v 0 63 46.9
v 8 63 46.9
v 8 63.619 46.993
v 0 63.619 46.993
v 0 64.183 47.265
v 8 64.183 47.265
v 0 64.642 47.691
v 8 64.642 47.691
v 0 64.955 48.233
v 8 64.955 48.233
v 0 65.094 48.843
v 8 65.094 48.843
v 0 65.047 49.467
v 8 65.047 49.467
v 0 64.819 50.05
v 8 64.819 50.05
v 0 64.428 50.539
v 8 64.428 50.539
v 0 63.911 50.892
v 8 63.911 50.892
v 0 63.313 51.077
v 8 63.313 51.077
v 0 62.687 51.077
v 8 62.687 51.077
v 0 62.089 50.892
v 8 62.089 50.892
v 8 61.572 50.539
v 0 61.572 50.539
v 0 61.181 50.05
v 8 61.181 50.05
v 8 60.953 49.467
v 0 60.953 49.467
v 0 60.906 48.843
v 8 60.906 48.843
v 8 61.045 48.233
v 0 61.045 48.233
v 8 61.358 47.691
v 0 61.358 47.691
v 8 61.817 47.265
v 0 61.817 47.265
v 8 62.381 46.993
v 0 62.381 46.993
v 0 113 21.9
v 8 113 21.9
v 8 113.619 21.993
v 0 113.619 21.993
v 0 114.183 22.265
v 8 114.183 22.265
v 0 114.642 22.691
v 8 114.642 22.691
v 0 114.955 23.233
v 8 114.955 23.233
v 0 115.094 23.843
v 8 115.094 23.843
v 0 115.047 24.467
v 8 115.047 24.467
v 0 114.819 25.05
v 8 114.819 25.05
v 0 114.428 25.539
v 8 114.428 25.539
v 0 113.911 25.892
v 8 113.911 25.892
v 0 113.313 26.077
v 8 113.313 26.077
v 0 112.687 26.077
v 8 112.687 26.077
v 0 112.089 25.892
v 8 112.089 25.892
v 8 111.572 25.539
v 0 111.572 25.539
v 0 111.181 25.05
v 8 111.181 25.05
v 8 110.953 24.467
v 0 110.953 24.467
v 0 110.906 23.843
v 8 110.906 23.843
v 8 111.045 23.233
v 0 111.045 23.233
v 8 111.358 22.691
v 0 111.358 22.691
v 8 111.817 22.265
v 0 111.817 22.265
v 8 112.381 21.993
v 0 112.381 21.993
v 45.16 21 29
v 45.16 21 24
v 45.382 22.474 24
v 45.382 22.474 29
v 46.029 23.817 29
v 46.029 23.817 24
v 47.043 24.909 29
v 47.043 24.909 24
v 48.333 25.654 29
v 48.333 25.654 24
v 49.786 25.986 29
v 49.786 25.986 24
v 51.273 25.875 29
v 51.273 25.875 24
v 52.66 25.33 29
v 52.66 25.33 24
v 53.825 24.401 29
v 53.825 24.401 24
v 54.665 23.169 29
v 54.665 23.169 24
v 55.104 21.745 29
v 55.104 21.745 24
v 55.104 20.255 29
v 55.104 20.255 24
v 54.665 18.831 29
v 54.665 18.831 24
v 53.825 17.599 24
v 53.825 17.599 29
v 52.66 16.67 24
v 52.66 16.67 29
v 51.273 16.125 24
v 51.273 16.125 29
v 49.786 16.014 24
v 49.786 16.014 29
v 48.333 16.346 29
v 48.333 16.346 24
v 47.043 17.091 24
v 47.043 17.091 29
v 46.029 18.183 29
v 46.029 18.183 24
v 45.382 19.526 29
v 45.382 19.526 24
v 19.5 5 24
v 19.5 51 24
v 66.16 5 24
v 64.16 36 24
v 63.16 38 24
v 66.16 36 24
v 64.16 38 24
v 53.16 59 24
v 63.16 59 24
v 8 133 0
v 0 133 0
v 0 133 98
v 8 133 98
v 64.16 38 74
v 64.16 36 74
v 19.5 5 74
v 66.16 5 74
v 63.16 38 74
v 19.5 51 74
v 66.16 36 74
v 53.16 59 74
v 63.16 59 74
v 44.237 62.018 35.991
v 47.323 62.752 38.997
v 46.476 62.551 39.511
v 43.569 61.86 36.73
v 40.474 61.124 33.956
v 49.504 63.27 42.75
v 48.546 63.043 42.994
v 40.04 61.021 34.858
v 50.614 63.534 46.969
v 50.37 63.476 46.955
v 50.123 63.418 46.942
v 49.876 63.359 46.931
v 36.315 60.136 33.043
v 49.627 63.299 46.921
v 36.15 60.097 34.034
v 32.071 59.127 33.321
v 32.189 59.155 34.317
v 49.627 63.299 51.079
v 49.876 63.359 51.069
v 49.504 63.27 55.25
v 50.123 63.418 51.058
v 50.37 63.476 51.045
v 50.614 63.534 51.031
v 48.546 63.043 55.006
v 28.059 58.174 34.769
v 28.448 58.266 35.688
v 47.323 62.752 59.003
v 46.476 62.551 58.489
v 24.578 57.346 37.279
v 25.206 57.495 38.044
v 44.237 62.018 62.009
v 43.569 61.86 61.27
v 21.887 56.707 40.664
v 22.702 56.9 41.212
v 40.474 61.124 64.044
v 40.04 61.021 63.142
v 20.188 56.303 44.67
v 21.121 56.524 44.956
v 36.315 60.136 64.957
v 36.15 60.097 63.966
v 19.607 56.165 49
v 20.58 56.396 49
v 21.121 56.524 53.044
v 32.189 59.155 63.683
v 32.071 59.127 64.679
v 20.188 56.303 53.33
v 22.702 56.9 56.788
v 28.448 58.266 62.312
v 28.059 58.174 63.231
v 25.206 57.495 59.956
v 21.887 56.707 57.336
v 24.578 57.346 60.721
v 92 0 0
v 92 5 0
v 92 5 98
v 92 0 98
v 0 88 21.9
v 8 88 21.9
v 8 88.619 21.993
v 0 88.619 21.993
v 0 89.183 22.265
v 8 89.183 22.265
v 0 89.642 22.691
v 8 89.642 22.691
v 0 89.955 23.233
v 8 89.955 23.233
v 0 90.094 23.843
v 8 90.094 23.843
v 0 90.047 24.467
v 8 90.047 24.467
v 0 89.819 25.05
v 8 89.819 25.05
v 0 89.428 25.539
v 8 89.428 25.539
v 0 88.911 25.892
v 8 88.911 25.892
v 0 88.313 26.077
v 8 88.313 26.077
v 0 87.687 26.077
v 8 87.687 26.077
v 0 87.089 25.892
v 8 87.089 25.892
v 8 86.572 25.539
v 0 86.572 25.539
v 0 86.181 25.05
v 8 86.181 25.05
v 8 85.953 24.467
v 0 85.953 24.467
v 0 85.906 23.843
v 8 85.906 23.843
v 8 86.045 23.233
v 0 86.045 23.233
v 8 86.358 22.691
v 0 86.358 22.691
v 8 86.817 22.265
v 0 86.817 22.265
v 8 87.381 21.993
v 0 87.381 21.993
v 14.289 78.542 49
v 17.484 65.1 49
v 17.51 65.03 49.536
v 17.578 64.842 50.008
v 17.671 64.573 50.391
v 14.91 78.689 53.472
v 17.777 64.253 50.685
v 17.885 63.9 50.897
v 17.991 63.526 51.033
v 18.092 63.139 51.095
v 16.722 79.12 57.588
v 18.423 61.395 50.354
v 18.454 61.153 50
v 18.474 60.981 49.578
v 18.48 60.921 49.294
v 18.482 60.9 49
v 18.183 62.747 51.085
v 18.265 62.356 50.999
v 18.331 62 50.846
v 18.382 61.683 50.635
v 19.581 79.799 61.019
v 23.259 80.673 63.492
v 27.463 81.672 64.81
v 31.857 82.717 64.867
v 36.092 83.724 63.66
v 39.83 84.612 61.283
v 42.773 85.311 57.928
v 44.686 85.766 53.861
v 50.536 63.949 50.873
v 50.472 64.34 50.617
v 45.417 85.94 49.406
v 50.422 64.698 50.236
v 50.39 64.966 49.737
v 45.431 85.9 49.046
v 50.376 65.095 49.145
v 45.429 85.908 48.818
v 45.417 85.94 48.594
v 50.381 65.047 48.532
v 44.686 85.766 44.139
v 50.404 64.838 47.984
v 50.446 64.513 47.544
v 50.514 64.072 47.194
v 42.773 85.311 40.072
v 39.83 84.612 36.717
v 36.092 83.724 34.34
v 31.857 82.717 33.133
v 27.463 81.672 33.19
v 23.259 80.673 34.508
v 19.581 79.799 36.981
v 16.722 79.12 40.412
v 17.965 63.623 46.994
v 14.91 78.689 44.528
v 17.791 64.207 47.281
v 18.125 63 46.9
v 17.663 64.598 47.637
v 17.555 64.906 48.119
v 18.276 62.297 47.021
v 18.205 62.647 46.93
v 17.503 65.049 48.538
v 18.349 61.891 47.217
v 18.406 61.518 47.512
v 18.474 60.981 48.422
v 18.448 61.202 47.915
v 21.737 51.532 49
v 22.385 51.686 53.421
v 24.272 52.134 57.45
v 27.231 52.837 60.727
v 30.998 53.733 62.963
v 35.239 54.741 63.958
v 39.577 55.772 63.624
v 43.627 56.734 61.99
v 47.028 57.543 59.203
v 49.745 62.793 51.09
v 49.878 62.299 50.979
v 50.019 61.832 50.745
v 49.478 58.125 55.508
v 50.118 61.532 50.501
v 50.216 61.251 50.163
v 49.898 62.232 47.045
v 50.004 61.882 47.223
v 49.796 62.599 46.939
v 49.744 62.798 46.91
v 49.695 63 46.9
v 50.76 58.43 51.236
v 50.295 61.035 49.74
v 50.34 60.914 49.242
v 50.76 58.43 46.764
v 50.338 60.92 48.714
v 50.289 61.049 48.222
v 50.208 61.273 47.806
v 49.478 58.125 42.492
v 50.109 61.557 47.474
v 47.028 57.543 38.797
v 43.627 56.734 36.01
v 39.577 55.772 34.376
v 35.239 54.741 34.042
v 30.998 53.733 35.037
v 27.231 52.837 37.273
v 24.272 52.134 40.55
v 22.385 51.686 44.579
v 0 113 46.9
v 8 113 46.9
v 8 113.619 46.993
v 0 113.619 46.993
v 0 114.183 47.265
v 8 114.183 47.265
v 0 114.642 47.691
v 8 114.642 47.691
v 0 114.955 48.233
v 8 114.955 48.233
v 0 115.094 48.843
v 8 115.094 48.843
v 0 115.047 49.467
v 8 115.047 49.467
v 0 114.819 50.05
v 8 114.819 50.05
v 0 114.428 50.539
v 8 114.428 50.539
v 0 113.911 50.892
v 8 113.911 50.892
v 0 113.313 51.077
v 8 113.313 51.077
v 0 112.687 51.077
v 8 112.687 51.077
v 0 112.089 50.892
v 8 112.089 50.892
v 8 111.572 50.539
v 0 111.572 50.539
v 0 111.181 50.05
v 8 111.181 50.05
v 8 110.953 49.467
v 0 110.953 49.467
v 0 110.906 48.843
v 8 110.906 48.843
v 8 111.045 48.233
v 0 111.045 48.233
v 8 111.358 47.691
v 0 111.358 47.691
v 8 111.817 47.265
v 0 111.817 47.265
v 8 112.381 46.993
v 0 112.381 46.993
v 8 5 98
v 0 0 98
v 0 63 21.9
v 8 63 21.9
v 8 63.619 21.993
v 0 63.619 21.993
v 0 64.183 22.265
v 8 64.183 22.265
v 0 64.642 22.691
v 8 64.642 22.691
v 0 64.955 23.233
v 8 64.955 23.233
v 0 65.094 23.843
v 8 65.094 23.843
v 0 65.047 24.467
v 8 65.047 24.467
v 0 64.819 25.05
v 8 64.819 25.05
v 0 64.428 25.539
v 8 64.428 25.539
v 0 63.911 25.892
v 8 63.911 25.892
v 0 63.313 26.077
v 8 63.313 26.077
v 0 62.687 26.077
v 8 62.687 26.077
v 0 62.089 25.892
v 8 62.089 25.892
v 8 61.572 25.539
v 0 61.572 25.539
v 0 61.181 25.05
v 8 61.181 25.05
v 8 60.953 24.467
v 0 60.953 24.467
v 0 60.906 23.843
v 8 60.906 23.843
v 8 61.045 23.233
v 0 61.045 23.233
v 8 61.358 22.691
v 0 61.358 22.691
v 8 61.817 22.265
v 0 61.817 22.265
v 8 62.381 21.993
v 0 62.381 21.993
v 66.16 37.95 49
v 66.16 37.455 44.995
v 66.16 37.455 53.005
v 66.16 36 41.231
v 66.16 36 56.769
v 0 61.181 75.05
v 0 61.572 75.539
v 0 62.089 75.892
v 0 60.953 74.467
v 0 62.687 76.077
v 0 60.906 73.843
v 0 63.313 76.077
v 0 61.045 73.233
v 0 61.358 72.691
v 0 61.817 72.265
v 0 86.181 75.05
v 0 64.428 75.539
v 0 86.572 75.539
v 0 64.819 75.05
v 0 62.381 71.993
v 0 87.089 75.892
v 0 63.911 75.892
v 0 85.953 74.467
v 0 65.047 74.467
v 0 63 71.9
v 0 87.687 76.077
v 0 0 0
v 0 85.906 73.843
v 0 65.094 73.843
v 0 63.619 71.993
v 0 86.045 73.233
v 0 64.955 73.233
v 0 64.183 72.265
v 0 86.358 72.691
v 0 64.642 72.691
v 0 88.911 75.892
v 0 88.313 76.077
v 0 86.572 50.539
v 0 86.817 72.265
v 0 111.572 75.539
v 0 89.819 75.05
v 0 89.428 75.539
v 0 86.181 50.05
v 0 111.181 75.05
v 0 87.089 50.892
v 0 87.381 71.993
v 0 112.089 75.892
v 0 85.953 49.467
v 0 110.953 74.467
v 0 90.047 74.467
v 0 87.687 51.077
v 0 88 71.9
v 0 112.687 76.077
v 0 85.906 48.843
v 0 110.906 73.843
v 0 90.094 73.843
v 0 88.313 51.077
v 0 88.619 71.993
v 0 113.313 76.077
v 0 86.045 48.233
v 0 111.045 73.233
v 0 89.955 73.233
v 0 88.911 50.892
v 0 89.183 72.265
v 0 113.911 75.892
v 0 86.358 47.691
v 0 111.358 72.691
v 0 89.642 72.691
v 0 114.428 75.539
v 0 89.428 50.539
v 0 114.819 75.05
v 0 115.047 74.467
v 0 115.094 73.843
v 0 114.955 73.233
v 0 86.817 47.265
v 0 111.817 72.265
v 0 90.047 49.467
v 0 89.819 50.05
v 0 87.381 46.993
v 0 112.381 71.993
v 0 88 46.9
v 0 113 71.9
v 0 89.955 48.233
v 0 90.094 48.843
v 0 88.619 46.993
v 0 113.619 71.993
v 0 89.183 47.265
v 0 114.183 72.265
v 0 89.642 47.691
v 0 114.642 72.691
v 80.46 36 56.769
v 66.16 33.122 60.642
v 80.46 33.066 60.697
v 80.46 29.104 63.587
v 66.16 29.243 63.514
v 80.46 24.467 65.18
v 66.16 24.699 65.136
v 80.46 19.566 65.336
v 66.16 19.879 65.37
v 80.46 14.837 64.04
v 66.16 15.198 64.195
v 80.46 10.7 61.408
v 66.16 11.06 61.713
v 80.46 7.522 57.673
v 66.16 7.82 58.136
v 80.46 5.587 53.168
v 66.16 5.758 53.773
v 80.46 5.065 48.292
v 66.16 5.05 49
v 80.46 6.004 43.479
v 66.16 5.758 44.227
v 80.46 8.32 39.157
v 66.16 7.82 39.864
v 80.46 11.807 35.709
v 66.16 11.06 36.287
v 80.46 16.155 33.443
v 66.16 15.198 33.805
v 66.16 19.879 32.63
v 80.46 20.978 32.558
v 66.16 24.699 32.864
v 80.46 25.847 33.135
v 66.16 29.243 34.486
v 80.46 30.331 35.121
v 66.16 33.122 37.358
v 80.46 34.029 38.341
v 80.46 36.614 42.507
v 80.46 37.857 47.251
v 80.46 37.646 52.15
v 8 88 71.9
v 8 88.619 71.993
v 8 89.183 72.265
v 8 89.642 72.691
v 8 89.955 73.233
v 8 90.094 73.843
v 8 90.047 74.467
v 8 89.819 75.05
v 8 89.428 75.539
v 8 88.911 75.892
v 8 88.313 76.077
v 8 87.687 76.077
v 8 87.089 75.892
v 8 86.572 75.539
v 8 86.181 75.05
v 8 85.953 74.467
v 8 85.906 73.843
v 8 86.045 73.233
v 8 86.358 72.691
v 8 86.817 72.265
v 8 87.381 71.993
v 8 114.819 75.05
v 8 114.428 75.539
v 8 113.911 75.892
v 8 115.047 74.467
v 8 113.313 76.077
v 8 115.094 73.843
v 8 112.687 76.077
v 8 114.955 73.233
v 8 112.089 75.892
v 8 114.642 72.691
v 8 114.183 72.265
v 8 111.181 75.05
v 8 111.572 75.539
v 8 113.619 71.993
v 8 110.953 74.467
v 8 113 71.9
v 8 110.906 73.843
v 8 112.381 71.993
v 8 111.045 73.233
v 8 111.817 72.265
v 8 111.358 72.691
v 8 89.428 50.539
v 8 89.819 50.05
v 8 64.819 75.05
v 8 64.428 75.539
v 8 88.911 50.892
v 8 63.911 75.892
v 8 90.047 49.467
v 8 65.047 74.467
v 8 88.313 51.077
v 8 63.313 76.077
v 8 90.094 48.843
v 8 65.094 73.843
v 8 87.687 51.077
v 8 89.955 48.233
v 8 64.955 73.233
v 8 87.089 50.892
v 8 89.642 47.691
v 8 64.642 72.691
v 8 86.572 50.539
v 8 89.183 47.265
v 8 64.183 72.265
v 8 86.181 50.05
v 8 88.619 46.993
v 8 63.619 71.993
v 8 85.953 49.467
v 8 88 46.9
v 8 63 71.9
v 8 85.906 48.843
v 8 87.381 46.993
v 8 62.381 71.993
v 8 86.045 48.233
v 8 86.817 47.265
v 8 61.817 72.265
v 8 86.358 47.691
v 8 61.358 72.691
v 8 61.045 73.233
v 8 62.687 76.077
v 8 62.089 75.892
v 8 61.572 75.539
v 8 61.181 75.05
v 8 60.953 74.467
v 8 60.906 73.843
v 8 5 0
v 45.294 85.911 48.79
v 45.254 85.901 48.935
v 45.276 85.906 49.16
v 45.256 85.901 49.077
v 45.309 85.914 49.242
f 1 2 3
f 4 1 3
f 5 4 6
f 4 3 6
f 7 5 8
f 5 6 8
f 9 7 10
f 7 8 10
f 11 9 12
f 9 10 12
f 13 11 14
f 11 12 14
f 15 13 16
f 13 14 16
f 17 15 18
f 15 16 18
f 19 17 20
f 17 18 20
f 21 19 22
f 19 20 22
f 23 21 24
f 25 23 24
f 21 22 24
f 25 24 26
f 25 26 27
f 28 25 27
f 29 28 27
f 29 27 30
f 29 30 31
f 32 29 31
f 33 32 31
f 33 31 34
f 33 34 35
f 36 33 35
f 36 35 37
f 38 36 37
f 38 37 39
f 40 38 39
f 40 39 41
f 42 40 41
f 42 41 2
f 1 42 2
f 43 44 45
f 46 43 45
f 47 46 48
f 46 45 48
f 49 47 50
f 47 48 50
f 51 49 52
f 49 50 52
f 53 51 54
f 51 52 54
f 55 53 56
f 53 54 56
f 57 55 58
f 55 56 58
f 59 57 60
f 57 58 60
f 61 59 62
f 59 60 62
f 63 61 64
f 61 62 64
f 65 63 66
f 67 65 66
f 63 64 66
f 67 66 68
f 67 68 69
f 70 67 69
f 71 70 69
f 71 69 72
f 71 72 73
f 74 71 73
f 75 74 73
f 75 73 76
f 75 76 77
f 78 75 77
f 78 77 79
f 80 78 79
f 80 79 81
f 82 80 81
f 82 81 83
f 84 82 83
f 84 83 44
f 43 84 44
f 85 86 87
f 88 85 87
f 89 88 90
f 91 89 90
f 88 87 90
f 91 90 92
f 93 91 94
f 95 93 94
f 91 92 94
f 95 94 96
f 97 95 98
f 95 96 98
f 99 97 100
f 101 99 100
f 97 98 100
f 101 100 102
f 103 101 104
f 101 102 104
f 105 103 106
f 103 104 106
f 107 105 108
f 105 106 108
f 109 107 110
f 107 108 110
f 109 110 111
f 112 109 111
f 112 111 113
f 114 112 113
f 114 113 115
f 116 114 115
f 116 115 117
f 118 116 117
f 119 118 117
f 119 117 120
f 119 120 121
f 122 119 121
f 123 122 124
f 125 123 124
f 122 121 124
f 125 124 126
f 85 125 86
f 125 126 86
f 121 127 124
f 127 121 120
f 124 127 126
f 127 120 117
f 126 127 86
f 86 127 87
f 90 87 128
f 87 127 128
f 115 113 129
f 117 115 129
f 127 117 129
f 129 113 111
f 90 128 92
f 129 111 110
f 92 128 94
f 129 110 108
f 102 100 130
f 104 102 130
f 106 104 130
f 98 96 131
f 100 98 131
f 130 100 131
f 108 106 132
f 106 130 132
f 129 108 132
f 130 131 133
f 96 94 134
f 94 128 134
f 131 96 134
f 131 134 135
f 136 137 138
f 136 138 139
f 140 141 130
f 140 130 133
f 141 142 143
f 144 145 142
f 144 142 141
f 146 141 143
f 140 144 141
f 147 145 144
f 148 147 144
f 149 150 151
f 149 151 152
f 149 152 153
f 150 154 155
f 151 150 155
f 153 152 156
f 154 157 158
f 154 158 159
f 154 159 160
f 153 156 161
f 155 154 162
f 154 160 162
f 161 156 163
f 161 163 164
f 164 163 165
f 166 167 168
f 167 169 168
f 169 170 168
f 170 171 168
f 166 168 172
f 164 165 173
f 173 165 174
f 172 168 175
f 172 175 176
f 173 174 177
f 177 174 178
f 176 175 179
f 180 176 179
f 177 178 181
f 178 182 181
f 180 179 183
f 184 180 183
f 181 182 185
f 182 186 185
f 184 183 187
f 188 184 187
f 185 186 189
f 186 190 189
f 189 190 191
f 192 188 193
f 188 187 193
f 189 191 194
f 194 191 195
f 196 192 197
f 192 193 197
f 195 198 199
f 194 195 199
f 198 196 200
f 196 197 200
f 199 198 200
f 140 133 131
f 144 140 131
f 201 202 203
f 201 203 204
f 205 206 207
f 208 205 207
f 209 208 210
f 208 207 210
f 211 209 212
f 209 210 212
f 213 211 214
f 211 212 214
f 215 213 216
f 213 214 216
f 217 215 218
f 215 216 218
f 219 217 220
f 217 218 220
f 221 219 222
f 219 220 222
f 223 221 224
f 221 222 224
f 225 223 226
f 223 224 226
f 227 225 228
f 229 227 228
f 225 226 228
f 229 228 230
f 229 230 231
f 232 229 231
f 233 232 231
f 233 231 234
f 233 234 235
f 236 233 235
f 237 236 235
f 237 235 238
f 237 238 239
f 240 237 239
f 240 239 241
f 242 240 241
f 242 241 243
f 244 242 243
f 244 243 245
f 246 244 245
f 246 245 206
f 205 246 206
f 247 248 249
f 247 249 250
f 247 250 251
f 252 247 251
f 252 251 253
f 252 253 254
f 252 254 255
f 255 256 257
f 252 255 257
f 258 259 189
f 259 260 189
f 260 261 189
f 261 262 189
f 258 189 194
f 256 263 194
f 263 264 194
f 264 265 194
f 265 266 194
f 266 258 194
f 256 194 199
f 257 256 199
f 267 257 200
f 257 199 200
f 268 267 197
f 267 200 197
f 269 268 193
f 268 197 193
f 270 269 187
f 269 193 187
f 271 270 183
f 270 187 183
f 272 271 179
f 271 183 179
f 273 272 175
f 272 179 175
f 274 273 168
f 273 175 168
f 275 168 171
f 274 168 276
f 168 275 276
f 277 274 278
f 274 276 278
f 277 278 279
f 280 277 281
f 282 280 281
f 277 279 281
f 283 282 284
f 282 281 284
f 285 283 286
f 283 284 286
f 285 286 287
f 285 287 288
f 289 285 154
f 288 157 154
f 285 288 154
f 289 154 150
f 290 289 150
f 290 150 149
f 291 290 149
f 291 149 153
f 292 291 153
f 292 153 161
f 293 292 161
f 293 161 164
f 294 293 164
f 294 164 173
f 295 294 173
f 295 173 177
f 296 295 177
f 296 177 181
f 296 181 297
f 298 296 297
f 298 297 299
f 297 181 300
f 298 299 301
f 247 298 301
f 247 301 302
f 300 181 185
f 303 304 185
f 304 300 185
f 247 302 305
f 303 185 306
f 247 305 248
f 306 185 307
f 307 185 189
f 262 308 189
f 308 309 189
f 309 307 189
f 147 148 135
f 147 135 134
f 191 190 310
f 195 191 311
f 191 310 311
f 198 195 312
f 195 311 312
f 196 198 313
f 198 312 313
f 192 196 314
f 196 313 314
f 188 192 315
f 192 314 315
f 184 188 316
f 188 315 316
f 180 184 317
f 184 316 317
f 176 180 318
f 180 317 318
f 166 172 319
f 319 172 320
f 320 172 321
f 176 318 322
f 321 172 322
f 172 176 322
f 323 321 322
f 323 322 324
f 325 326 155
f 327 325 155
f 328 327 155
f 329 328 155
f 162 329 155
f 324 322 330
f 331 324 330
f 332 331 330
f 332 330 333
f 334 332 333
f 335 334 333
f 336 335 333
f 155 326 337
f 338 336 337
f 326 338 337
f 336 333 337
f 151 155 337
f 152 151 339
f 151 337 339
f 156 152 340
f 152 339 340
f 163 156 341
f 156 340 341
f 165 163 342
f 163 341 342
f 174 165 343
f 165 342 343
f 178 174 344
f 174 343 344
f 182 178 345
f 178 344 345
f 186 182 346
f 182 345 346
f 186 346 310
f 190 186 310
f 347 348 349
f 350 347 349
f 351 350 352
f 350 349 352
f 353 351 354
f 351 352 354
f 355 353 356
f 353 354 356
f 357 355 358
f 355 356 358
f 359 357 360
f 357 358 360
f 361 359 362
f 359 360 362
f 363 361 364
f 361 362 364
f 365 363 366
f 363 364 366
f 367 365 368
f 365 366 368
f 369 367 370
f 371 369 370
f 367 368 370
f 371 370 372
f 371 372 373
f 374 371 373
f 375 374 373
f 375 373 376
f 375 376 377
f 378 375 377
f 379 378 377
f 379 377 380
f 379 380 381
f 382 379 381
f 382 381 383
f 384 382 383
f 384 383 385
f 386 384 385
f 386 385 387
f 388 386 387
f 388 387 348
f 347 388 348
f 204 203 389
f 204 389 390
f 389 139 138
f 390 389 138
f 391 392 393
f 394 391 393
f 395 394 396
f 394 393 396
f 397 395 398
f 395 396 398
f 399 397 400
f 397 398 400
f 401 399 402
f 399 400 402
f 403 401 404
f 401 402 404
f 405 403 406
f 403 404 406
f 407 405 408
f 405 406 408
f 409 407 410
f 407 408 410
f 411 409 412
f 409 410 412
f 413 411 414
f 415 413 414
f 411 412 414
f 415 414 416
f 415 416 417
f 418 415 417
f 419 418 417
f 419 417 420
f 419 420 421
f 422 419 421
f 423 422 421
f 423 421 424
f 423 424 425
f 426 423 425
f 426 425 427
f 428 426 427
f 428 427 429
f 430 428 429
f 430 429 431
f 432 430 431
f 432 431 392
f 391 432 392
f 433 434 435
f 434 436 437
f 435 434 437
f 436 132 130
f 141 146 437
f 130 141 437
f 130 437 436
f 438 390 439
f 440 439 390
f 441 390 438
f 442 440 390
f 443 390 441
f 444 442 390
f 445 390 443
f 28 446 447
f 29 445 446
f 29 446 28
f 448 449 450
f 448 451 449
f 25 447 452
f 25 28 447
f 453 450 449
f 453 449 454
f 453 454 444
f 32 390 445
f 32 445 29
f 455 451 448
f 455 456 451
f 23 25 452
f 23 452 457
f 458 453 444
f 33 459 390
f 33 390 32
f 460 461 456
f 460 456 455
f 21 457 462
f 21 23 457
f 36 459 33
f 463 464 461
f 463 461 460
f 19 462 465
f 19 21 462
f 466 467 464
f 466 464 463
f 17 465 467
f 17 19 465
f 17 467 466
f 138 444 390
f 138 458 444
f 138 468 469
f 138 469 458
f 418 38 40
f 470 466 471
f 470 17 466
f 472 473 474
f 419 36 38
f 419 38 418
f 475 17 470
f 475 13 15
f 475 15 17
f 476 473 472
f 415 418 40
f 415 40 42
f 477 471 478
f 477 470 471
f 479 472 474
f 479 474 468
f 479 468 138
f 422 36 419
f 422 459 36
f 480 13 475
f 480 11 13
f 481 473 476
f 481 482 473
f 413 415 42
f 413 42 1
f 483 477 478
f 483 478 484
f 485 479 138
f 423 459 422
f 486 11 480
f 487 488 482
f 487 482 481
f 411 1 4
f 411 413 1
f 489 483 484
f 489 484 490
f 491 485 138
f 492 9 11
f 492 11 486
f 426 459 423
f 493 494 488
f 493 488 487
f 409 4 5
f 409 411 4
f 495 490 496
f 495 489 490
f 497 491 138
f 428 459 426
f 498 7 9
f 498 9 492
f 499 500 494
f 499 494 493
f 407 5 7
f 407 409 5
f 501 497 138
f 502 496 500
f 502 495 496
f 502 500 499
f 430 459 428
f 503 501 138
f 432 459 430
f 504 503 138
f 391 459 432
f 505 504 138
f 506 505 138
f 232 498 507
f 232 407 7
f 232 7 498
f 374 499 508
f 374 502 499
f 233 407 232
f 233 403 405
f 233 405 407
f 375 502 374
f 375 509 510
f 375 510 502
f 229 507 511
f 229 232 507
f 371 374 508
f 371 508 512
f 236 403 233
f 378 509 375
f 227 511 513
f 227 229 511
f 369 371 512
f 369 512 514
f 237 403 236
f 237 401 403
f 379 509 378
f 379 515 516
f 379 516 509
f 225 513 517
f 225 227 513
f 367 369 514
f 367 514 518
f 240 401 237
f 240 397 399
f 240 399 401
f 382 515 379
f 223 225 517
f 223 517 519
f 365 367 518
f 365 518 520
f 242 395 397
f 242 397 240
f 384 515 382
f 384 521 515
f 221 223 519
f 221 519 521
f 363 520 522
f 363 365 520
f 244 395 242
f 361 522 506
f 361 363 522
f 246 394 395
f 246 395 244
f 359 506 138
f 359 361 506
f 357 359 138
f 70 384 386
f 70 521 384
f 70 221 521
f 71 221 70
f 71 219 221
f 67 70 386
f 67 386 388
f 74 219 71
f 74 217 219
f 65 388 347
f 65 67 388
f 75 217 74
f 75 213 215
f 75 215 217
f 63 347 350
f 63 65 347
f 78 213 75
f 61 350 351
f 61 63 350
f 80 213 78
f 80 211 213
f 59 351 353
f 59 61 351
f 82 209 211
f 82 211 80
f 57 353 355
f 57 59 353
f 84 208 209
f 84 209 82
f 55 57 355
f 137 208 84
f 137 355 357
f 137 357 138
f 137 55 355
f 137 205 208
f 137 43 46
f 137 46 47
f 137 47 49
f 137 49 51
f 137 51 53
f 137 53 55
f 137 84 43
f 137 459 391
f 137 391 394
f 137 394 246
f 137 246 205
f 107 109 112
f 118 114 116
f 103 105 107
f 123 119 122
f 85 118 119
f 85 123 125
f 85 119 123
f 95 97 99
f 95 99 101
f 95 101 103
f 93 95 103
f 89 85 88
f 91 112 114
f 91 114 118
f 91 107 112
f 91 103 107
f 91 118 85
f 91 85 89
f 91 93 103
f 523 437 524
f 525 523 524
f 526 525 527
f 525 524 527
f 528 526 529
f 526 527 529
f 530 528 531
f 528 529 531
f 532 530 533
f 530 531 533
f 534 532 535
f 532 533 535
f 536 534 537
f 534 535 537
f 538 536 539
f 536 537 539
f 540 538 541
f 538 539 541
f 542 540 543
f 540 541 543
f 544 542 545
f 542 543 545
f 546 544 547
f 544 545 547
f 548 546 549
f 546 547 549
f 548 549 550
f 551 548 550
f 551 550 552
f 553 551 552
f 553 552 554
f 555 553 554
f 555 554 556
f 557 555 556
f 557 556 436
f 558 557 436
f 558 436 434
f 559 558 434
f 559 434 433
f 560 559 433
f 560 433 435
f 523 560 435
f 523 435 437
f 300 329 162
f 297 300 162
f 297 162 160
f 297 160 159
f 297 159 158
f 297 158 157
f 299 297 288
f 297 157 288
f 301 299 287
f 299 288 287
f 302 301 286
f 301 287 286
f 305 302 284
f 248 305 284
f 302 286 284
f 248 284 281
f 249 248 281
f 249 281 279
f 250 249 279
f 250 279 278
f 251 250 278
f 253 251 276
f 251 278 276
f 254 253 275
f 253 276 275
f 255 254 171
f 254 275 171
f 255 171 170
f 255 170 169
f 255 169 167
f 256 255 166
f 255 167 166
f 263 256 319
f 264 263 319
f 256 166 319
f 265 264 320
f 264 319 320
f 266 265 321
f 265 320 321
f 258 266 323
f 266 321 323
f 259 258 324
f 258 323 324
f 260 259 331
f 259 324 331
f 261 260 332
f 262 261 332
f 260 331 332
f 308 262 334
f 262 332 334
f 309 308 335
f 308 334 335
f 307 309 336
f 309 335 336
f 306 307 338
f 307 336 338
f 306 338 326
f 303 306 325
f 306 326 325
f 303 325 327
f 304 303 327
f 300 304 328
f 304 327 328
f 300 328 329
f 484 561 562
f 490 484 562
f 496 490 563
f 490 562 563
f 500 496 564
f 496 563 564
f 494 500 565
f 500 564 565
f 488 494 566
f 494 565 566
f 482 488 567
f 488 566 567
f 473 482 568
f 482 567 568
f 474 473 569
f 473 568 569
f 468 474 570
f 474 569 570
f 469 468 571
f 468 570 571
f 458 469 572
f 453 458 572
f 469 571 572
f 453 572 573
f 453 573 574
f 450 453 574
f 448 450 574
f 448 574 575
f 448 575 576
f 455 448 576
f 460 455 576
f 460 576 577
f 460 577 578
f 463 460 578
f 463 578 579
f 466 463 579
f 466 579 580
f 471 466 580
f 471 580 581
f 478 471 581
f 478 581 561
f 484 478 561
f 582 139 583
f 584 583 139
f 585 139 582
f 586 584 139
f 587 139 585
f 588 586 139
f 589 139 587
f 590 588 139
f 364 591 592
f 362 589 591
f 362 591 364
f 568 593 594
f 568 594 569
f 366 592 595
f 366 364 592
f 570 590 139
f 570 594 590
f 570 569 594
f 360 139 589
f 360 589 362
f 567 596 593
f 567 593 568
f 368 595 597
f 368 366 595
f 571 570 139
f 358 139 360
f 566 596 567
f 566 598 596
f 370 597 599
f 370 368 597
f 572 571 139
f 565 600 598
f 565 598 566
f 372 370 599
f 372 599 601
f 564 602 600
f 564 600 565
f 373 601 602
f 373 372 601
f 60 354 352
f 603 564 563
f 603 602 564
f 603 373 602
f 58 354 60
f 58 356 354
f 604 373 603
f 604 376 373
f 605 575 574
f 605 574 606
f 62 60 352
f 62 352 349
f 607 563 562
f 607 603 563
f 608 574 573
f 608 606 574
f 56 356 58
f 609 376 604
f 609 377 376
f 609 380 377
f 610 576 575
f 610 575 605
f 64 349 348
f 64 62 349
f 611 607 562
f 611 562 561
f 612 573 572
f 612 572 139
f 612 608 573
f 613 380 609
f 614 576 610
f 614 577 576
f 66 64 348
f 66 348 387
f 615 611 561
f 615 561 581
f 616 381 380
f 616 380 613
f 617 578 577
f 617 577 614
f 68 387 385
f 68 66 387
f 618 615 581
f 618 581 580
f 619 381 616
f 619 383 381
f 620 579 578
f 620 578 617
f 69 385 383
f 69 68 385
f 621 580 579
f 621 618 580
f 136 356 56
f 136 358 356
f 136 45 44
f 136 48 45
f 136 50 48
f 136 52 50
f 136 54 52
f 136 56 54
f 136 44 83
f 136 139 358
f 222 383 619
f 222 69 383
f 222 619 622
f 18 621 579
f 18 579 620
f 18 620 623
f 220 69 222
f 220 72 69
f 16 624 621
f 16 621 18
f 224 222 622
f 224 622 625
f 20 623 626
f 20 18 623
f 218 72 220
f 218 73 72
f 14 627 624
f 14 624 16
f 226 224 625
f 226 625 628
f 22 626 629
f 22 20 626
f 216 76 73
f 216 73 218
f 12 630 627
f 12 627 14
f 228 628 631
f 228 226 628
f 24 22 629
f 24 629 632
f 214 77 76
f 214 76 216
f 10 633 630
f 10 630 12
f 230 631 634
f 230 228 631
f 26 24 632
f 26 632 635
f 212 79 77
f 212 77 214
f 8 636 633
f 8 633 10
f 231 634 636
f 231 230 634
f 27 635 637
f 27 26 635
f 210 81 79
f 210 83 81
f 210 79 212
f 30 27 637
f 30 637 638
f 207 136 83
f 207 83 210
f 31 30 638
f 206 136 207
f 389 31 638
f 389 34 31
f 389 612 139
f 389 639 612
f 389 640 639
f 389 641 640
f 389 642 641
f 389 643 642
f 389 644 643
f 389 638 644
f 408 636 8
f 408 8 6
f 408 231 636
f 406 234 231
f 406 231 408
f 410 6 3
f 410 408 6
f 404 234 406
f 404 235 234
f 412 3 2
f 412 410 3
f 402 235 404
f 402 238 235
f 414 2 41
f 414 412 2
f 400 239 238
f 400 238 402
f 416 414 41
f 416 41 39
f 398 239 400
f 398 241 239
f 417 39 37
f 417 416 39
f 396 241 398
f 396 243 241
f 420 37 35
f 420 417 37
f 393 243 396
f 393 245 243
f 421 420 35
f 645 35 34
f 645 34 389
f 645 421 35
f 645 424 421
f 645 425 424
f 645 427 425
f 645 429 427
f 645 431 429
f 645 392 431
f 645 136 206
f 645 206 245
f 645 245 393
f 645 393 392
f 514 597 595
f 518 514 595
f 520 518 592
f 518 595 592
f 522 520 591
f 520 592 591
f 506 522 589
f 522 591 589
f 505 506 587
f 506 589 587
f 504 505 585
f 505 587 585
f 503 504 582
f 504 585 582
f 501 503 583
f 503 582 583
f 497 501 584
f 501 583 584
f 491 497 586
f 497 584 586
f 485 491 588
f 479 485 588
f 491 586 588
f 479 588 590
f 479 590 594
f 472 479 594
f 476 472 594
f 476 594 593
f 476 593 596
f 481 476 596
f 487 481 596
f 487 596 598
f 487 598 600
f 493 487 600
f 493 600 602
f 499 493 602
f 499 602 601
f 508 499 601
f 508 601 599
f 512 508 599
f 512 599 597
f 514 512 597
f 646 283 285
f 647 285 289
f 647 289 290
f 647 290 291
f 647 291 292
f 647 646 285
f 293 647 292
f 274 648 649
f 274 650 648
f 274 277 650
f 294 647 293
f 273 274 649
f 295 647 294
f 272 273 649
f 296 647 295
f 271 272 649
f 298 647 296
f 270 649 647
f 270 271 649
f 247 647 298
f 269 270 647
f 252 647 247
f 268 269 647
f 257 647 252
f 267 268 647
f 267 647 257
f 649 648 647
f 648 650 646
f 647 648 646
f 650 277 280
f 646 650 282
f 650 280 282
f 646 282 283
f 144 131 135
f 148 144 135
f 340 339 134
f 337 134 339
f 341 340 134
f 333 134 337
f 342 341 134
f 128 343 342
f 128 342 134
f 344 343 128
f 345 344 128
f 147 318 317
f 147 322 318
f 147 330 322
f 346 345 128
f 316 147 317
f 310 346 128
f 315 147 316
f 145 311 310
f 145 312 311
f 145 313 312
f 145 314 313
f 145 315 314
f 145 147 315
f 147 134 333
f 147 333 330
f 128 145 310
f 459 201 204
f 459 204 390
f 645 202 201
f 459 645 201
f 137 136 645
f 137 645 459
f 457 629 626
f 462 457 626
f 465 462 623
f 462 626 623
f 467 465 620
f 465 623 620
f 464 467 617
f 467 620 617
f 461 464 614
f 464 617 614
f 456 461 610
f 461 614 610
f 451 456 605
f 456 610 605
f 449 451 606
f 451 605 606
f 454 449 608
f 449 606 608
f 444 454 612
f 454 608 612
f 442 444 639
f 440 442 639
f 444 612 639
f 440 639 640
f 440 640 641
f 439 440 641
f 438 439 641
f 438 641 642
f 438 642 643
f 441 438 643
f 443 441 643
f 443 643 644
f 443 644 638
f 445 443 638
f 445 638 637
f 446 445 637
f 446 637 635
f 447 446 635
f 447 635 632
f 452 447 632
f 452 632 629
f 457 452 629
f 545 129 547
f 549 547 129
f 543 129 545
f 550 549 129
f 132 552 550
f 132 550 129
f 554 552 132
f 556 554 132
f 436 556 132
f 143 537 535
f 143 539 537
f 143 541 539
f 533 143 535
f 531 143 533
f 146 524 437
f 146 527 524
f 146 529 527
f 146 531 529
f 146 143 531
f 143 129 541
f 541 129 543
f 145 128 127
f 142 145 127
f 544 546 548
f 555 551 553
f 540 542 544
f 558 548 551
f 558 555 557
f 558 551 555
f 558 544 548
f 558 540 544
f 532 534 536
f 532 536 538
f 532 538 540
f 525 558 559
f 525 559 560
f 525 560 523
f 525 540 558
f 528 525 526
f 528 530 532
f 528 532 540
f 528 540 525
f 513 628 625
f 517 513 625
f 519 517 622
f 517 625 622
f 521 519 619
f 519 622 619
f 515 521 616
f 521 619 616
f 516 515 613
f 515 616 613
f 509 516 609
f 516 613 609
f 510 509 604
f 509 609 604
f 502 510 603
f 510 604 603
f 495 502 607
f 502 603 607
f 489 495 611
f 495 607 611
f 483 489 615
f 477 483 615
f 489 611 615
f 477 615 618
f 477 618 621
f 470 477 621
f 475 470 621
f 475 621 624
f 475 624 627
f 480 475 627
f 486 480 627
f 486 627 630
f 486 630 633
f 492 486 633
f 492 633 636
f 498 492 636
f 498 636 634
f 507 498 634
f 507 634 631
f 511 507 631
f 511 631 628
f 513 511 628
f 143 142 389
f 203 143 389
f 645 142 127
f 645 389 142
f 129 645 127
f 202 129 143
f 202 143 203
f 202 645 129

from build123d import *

# Parameters (mm, degrees)
EXTRUDE_1_DEPTH     = 98
EXTRUDE_2_DEPTH     = 25
SKETCH_4_R          = 16.45
EXTRUDE_6_DEPTH     = 14.3
SKETCH_5_R          = 15
EXTRUDE_7_DEPTH     = 5
SKETCH_6_R          = 16
EXTRUDE_8_DEPTH     = 23
SKETCH_7_R          = 5
CUT_EXTRUDE_2_DEPTH = 5
HOLE_WIZARD_M5_1_D  = 4.2


with BuildPart() as part:
    # 草图1 → 凸台-拉伸1 (new body)
    with BuildSketch(Plane.XY):
        Polygon((0, 0), (0, 133), (8, 133), (8, 5), (92, 5), (92, 0), align=None)
    extrude(amount=EXTRUDE_1_DEPTH)



with BuildPart() as body_2:
    # 草图2 → 凸台-拉伸2 (new, symmetric)
    with BuildSketch(Plane.XY.offset(49)):
        Polygon((66.16, 36), (64.16, 36), (64.16, 38), (63.16, 38), (63.16, 59), (53.16, 59), (19.5, 51), (19.5, 5), (66.16, 5), align=None)
    extrude(amount=EXTRUDE_2_DEPTH, both=True)


with BuildPart() as part_1:
    add(part.part)

    add(body_2.part)  # 凸台-拉伸6 merges body 2
    # 草图4 → 凸台-拉伸6 (add)
    with BuildSketch(Plane(origin=(66.16, 0, 0), x_dir=(0, 0, -1), z_dir=(1, 0, 0))):
        with Locations(Location((-49, 21.5, 0), (0, 0, 118.181138406))):
            Circle(SKETCH_4_R)
    extrude(amount=EXTRUDE_6_DEPTH)

    # 草图5 → 凸台-拉伸7 (add)
    with BuildSketch(Plane(origin=(-10.430514532, 43.886389891, 0), x_dir=(0.9728991739264884, 0.23122975019049047, 0), z_dir=(-0.23122975019049047, 0.9728991739264884, 0))):
        with Locations(Location((48.063063249, -49, 0), (0, 0, 180))):
            Circle(SKETCH_5_R)
    extrude(amount=EXTRUDE_7_DEPTH)

    # 草图6 → 凸台-拉伸8 (add)
    with BuildSketch(Plane(origin=(-11.586663283, 48.750885761, 0), x_dir=(0.9728991739264884, 0.2312297501904905, 0), z_dir=(-0.2312297501904905, 0.9728991739264884, 0))):
        with Locations(Location((48.063063249, -49, 0), (0, 0, 180))):
            Circle(SKETCH_6_R)
    extrude(amount=EXTRUDE_8_DEPTH)

    # 草图7 → 切除-拉伸2 (cut)
    with BuildSketch(Plane(origin=(0, 0, 24), x_dir=(-1, 0, 0), z_dir=(0, 0, -1))):
        with Locations((-50.16, 21)):
            Circle(SKETCH_7_R)
    extrude(amount=-CUT_EXTRUDE_2_DEPTH, mode=Mode.SUBTRACT)

    # M5 螺纹孔1 (through all)
    with Locations(Plane.ZY):
        with Locations((24, 63), (49, 63), (74, 63), (74, 88), (49, 88), (24, 88), (24, 113), (49, 113), (74, 113)):
            Hole(HOLE_WIZARD_M5_1_D / 2)


solid = part_1.part
